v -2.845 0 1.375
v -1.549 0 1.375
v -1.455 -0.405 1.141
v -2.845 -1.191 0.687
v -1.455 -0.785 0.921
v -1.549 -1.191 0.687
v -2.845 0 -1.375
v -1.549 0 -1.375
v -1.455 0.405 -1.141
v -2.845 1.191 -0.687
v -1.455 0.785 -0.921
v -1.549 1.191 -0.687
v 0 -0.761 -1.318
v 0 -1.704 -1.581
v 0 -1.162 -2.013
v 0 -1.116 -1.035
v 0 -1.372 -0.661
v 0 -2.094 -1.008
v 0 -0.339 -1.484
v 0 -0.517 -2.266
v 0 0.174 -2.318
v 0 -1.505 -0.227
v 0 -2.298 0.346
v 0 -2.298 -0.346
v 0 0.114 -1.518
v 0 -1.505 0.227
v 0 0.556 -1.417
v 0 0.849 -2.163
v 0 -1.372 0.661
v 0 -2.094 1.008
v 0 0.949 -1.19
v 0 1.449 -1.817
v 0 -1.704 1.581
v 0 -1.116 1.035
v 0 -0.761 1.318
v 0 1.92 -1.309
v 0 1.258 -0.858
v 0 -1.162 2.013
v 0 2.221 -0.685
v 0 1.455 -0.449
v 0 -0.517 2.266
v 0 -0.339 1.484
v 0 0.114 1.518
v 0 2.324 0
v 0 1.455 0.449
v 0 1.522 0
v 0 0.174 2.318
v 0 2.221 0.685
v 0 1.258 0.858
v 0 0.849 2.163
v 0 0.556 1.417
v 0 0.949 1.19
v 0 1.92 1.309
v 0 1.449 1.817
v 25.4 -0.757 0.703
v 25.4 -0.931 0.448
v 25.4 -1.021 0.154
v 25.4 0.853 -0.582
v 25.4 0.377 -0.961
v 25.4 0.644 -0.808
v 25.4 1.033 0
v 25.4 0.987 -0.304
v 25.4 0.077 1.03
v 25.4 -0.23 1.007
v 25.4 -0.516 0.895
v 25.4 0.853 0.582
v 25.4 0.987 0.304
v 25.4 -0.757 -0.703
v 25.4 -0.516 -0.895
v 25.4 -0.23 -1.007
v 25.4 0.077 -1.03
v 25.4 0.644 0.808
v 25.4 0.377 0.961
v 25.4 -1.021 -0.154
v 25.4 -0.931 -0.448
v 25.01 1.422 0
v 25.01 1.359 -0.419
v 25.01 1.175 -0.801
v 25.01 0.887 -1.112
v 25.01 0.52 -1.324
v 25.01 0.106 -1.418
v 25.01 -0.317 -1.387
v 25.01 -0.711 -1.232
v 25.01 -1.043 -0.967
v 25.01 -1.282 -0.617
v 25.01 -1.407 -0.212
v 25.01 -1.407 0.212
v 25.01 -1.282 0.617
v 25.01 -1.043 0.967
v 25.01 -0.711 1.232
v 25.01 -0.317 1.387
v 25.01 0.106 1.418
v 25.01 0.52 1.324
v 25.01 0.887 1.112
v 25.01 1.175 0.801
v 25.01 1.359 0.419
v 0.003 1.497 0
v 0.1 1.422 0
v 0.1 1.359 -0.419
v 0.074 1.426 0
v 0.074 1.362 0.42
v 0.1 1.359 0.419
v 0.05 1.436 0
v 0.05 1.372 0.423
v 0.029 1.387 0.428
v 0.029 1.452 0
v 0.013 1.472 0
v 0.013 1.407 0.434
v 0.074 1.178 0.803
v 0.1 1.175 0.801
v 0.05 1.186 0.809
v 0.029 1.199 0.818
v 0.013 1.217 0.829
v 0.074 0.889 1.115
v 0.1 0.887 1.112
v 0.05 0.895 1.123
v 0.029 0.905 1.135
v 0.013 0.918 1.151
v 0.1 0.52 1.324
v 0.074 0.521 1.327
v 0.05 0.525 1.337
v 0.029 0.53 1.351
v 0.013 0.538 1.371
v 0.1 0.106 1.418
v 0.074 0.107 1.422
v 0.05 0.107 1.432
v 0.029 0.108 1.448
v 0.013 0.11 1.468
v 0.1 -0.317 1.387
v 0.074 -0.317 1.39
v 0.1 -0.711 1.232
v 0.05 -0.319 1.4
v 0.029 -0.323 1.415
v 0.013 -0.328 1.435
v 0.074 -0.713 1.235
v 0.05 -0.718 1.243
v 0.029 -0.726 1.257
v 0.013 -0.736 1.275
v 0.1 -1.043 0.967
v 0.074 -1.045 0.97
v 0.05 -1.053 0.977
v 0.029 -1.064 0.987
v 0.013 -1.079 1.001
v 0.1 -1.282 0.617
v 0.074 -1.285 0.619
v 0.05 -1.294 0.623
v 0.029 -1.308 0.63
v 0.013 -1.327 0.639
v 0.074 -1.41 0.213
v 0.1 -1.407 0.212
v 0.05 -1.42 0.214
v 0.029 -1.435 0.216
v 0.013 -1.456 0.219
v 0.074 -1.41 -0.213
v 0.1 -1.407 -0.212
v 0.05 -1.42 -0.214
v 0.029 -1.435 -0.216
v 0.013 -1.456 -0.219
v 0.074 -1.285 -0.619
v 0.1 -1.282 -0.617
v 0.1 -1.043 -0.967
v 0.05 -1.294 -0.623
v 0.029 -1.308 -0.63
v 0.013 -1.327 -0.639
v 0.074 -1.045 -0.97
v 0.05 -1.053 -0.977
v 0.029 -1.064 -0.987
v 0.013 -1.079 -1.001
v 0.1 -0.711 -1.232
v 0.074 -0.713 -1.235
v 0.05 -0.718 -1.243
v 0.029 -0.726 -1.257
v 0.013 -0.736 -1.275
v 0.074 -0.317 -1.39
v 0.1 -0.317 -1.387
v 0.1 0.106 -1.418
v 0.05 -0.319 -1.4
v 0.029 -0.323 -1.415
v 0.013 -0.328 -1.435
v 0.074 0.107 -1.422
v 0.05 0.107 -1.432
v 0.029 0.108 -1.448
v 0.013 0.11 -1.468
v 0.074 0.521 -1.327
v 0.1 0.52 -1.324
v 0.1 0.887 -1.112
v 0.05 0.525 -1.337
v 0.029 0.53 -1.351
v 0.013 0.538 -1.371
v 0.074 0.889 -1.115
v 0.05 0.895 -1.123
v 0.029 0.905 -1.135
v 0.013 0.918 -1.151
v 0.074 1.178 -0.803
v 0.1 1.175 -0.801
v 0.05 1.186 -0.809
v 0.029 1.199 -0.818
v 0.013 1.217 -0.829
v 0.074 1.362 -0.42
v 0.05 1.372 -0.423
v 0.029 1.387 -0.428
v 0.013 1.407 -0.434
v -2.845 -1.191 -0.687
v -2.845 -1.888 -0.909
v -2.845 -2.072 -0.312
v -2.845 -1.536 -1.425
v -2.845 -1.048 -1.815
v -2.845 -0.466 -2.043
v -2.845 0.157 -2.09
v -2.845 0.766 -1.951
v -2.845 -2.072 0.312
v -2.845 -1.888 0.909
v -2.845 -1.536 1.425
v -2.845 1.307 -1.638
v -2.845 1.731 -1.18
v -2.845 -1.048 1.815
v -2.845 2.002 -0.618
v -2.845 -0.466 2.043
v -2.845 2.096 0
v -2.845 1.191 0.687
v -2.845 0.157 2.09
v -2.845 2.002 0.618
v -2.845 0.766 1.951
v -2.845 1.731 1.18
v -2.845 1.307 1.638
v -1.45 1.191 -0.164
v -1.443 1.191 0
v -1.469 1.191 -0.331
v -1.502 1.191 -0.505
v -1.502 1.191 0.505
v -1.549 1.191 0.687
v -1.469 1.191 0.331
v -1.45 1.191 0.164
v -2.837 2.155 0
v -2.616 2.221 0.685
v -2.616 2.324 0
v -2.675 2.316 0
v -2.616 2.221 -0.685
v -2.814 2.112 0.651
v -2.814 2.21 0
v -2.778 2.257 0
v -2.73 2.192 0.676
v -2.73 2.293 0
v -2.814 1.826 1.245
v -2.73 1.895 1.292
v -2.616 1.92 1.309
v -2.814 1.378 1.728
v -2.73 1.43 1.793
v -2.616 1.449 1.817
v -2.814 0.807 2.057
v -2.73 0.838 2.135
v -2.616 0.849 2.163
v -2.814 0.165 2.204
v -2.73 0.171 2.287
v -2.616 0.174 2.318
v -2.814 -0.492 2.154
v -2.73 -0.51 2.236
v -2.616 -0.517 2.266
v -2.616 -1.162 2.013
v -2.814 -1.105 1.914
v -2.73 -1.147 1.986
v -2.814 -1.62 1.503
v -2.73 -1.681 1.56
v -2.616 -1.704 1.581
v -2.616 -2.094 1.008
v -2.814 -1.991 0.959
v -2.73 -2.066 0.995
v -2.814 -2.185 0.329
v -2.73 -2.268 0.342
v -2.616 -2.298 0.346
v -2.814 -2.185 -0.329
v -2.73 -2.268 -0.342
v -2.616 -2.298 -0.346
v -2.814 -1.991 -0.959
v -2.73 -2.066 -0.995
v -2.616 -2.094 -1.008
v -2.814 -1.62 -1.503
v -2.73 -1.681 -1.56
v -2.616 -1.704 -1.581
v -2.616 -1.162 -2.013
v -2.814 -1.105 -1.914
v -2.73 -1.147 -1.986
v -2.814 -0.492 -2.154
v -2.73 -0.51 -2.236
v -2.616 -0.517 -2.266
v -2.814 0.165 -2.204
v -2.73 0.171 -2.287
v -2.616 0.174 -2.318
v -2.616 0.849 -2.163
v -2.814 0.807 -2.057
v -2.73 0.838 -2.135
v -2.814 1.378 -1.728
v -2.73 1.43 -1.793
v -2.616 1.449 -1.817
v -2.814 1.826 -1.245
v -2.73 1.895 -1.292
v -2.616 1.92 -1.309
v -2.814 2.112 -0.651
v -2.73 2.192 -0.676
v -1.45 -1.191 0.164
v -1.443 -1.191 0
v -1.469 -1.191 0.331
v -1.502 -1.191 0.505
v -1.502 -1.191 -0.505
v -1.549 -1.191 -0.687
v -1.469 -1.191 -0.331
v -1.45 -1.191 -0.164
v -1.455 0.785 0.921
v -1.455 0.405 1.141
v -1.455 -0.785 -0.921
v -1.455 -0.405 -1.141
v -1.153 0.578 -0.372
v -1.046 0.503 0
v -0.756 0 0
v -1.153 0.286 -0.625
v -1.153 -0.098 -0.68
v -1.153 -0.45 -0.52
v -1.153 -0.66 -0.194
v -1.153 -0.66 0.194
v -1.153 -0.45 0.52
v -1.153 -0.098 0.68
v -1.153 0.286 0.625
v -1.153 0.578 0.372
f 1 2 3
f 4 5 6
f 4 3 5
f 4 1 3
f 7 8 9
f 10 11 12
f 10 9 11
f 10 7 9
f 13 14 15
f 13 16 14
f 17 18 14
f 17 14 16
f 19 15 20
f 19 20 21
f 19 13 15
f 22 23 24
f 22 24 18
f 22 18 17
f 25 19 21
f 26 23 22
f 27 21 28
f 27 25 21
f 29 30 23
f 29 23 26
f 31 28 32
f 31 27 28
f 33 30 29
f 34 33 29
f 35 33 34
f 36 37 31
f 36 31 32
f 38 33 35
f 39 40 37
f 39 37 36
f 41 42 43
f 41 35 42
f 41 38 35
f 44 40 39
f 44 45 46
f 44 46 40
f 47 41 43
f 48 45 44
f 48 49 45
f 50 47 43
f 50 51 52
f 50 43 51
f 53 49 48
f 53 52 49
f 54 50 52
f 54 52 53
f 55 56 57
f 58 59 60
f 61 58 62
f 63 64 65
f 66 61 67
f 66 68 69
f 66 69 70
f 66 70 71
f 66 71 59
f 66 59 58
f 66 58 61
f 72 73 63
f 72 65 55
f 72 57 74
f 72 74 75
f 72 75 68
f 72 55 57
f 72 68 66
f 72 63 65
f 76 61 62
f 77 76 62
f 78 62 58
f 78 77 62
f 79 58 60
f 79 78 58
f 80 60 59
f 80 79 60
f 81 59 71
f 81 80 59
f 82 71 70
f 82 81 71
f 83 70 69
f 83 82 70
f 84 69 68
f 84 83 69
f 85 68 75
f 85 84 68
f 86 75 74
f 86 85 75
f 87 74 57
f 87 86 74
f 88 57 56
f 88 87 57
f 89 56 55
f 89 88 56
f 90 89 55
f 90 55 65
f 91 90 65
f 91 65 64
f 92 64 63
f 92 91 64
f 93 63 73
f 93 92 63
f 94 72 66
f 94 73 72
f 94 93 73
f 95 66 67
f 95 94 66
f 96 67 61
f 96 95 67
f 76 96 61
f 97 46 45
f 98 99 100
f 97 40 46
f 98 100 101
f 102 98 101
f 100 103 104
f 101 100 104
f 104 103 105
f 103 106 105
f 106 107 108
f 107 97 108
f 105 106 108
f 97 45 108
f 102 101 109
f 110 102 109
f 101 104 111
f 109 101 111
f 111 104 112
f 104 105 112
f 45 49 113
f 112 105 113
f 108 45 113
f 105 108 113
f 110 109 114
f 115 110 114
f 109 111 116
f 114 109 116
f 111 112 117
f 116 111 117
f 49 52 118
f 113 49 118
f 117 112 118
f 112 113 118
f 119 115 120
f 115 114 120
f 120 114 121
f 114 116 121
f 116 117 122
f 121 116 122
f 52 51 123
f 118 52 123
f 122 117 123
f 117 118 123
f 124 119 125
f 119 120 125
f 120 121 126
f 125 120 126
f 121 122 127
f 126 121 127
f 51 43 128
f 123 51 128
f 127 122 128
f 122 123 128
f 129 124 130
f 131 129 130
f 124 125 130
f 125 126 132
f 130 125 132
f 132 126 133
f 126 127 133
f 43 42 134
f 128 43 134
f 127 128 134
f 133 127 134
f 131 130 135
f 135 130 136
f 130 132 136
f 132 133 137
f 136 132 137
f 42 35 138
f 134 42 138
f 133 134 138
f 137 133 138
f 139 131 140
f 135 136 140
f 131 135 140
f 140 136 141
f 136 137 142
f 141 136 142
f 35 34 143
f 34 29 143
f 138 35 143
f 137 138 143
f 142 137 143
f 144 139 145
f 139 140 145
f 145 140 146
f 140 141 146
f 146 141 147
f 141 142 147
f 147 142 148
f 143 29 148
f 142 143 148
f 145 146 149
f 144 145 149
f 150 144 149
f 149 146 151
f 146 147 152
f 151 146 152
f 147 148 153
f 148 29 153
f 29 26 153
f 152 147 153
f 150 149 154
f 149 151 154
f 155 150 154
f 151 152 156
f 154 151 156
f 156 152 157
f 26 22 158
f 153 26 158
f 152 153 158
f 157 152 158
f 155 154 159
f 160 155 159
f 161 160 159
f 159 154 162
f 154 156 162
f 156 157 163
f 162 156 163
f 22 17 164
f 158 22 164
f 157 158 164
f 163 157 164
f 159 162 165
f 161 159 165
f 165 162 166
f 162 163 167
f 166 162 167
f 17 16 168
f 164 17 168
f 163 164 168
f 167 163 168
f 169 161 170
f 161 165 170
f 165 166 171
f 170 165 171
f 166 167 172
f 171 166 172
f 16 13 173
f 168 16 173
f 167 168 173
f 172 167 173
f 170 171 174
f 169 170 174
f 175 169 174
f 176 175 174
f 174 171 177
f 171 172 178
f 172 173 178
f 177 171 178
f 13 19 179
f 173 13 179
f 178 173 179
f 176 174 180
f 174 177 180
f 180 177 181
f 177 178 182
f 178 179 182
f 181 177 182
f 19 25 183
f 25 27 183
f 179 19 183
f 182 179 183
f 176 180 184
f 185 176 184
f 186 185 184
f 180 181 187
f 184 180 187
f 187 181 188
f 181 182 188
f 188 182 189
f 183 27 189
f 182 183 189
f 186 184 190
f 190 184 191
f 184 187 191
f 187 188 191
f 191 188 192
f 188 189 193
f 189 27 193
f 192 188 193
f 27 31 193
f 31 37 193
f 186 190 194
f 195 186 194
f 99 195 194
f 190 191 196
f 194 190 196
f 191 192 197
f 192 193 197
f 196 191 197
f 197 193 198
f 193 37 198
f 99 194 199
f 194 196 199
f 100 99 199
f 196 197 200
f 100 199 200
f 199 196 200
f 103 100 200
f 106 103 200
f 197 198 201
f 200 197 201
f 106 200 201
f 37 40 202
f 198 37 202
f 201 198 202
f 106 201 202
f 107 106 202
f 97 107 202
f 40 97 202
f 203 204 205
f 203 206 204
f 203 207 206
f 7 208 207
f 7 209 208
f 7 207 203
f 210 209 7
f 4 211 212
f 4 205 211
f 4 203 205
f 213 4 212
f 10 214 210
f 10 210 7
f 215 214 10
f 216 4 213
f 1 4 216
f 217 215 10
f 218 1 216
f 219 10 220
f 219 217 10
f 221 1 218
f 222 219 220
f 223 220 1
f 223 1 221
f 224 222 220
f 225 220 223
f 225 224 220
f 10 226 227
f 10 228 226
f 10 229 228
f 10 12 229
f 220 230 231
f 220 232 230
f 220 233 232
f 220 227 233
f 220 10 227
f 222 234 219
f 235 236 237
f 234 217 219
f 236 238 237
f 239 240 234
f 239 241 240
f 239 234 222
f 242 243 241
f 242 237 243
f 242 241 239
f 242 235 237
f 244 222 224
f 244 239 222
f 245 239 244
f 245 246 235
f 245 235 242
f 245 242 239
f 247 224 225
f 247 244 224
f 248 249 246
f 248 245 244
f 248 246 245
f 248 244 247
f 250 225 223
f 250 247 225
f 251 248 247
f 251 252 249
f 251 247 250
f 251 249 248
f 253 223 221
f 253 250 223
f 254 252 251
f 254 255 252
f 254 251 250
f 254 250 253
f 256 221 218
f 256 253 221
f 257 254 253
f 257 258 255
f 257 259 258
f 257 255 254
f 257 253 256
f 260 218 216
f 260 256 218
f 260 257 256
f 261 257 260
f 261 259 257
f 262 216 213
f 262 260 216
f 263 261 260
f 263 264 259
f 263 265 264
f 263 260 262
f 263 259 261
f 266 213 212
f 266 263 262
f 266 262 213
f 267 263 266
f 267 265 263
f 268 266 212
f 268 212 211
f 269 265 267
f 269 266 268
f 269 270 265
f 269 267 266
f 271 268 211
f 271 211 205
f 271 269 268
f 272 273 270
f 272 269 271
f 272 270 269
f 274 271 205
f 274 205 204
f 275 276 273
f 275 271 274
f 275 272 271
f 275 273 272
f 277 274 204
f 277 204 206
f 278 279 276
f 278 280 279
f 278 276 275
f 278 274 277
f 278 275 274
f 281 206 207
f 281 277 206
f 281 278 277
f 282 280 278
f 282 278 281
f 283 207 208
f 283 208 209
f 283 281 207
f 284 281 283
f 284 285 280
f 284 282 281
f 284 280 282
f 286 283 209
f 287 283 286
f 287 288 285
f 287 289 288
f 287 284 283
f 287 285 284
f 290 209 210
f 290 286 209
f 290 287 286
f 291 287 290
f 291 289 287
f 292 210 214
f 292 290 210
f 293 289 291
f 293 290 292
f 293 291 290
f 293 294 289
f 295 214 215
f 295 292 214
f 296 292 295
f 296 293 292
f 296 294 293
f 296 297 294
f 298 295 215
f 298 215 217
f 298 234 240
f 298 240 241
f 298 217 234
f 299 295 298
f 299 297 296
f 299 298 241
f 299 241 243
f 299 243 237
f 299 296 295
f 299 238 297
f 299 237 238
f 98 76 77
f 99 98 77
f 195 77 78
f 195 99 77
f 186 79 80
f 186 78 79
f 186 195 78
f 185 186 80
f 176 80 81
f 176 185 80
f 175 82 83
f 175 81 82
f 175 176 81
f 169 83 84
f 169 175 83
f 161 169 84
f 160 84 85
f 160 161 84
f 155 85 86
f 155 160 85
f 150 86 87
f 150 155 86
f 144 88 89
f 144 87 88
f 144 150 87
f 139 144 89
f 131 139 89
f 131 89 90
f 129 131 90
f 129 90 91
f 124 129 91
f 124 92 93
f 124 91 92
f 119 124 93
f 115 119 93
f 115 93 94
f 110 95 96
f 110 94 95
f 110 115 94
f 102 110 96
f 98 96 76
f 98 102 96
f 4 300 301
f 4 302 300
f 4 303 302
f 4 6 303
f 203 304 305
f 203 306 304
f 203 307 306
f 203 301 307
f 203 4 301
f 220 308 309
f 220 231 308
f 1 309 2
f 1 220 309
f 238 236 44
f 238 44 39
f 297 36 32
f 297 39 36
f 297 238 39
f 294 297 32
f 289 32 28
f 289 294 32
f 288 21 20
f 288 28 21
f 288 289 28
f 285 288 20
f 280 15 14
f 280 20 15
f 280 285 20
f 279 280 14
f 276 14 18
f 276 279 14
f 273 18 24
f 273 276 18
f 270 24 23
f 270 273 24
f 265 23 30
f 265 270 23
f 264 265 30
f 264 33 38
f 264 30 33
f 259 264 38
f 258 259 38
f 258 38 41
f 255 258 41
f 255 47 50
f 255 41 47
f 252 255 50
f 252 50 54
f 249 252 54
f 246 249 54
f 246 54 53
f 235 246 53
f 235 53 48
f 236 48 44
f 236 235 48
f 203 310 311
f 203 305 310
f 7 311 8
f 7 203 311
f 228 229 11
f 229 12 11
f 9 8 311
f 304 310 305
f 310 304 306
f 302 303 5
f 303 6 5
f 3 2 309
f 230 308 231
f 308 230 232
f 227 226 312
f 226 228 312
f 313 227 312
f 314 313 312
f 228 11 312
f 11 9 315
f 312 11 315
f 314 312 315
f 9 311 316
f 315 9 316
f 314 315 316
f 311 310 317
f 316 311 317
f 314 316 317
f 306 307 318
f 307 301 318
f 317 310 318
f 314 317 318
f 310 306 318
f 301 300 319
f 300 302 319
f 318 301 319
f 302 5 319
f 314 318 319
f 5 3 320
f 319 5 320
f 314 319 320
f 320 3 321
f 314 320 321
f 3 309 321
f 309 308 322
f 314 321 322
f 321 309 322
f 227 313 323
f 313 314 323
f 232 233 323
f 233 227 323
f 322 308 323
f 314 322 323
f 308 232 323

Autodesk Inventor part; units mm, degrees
ref_plane "YZ Plane" through (0, 0, 0) normal (1, 0, 0) x (0, 1, 0)
ref_plane "XZ Plane" through (0, 0, 0) normal (0, 1, 0) x (-1, 0, 0)
sketch "Sketch1" plane through (0, 0, 0) normal (0, 0, 1) x (1, 0, 0)
  line L0 (-0.7556, 0) -> (25.4, 0)
  line L1 (25.4, 0) -> (25.4, 1.4224)
  line L2 (25.4, 1.4224) -> (6.35, 1.4224)
  line L3 (6.35, 1.4224) -> (5.0799, 1.4224)
  line L4 (5.0799, 1.4224) -> (0, 1.4224)
  line L5 (0, 1.4224) -> (0, 2.3241)
  line L6 (0, 2.3241) -> (-2.8448, 2.3241)
  line L7 (-2.8448, 2.3241) -> (-2.8448, 1.3748)
  line L8 (-2.8448, 1.3748) -> (-1.5494, 1.3748)
  line L9 (-1.5494, 1.3748) -> (-0.7556, 0)
  line L10 (-8.4938, 0) -> (31.049, 0) projected
  line L11 (0, -0.4648) -> (0, 2.7889) projected
  line L12 (6.35, 1.4224) -> (0, 1.4224) construction
  dimension "d1" = 19.05
  dimension "d2" = 1.2701
  dimension "d3" = 2.8448
  dimension "d4" = 1.2954
  dimension "d5" = 60
  dimension "d6" = 2.8448
  dimension "d7" = 2.8448
  dimension "d8" = 2.7496
  dimension "d9" = 4.6482
  dimension "d26" = 25.4
revolve "Body" add sketch "Sketch1" angle 360 about axis through (-0.7556, 0, 0) along (1, 0, 0)
sketch "Sketch2" plane through (-2.8448, 0, 0) normal (-1, 0, 0) x (0, 0, 1)
  circle A0 centre (0, 0) radius 1.3748 projected
  line L0 (0, -3.2537) -> (0, 3.2537) projected
  line L1 (-3.2537, 0) -> (3.2537, 0) projected
  line L2 (1.3748, 0) -> (0.6874, -1.1906)
  line L3 (0.6874, -1.1906) -> (-0.6874, -1.1906)
  line L4 (-0.6874, -1.1906) -> (-1.3748, 0)
  line L5 (-1.3748, 0) -> (-0.6874, 1.1906)
  line L6 (-0.6874, 1.1906) -> (0.6874, 1.1906)
  line L7 (0.6874, 1.1906) -> (1.3748, 0)
  point P0 (0, 0)
extrude "Slot" add sketch "Sketch2" against normal up to next contours L7 A0 | A0 L2 | L6 L0 A0 | A0 L0 L3 | L0 L6 A0 | A0 L3 L0 | L4 A0 | A0 L5
fillet "Fillet1" radius 0.2286 1 edges at (-2.8448, -2.3241, 0)
thread "Thread" size "4-40 UNC" class "2A" standard "ANSI Unified Screw Threads" length 19.05
chamfer "Chamfer1" distance 0.3895 distance2 0.3896 1 edges at (25.4, -1.4224, 0) measured on face at (25.4, 0.2736, 0.8712)
ref_plane "Work Plane1" through (29, 0, 0) normal (0, -1, 0) x (1, 0, 0)
fillet "Fillet2" radius 0.1 1 edges at (0, -1.4224, 0)
equation "\"d1\" = GEL"
equation "\"d3\" = KOH"
equation "\"d4\" = INTI"
equation "\"d6\" = GD"
equation "\"d7\" = BDM"
equation "\"d8\" = 1.1547 * SW"
equation "\"d9\" = KOD"
equation "\"d26\" = NLG"
equation "\"d30\" = R"
equation "\"d17\" = RR"
equation "\"d13\" = GEL"
equation "\"d15\" = -0.5 * SPD + 0.5 * GD"
equation "\"d16\" = GUL"
equation "\"GD\" = NND"
equation "\"NLG\" = 25.4"
equation "\"GEL\" = 19.05"
equation "\"KOD\" = 4.6482"
equation "\"KOH\" = NND"
equation "\"INTI\" = 1.2954"
equation "\"GAL\" = 1.27"
equation "\"GUL\" = 0.38964"
equation "\"BDM\" = NND"
equation "\"SW\" = 2.38125"
equation "\"RR\" = 0.2286"
equation "\"SPD\" = GD1"
equation "\"R\" = 0.1"
equation "\"PHH\" = 0.1 * NND"
equation "\"THREADDIA\" = 2.8448"
equation "\"FAWI\" = 45deg"
equation "\"NND\" = 2.8448"
equation "\"E0\" = 1.155 * SW"
equation "\"FAWI1\" = 30deg"
equation "\"TOA\" = 30deg"
equation "\"GD1\" = 2.06573"
properties part number "Unbrako - 4 x 1" material "Steel, Mild"
